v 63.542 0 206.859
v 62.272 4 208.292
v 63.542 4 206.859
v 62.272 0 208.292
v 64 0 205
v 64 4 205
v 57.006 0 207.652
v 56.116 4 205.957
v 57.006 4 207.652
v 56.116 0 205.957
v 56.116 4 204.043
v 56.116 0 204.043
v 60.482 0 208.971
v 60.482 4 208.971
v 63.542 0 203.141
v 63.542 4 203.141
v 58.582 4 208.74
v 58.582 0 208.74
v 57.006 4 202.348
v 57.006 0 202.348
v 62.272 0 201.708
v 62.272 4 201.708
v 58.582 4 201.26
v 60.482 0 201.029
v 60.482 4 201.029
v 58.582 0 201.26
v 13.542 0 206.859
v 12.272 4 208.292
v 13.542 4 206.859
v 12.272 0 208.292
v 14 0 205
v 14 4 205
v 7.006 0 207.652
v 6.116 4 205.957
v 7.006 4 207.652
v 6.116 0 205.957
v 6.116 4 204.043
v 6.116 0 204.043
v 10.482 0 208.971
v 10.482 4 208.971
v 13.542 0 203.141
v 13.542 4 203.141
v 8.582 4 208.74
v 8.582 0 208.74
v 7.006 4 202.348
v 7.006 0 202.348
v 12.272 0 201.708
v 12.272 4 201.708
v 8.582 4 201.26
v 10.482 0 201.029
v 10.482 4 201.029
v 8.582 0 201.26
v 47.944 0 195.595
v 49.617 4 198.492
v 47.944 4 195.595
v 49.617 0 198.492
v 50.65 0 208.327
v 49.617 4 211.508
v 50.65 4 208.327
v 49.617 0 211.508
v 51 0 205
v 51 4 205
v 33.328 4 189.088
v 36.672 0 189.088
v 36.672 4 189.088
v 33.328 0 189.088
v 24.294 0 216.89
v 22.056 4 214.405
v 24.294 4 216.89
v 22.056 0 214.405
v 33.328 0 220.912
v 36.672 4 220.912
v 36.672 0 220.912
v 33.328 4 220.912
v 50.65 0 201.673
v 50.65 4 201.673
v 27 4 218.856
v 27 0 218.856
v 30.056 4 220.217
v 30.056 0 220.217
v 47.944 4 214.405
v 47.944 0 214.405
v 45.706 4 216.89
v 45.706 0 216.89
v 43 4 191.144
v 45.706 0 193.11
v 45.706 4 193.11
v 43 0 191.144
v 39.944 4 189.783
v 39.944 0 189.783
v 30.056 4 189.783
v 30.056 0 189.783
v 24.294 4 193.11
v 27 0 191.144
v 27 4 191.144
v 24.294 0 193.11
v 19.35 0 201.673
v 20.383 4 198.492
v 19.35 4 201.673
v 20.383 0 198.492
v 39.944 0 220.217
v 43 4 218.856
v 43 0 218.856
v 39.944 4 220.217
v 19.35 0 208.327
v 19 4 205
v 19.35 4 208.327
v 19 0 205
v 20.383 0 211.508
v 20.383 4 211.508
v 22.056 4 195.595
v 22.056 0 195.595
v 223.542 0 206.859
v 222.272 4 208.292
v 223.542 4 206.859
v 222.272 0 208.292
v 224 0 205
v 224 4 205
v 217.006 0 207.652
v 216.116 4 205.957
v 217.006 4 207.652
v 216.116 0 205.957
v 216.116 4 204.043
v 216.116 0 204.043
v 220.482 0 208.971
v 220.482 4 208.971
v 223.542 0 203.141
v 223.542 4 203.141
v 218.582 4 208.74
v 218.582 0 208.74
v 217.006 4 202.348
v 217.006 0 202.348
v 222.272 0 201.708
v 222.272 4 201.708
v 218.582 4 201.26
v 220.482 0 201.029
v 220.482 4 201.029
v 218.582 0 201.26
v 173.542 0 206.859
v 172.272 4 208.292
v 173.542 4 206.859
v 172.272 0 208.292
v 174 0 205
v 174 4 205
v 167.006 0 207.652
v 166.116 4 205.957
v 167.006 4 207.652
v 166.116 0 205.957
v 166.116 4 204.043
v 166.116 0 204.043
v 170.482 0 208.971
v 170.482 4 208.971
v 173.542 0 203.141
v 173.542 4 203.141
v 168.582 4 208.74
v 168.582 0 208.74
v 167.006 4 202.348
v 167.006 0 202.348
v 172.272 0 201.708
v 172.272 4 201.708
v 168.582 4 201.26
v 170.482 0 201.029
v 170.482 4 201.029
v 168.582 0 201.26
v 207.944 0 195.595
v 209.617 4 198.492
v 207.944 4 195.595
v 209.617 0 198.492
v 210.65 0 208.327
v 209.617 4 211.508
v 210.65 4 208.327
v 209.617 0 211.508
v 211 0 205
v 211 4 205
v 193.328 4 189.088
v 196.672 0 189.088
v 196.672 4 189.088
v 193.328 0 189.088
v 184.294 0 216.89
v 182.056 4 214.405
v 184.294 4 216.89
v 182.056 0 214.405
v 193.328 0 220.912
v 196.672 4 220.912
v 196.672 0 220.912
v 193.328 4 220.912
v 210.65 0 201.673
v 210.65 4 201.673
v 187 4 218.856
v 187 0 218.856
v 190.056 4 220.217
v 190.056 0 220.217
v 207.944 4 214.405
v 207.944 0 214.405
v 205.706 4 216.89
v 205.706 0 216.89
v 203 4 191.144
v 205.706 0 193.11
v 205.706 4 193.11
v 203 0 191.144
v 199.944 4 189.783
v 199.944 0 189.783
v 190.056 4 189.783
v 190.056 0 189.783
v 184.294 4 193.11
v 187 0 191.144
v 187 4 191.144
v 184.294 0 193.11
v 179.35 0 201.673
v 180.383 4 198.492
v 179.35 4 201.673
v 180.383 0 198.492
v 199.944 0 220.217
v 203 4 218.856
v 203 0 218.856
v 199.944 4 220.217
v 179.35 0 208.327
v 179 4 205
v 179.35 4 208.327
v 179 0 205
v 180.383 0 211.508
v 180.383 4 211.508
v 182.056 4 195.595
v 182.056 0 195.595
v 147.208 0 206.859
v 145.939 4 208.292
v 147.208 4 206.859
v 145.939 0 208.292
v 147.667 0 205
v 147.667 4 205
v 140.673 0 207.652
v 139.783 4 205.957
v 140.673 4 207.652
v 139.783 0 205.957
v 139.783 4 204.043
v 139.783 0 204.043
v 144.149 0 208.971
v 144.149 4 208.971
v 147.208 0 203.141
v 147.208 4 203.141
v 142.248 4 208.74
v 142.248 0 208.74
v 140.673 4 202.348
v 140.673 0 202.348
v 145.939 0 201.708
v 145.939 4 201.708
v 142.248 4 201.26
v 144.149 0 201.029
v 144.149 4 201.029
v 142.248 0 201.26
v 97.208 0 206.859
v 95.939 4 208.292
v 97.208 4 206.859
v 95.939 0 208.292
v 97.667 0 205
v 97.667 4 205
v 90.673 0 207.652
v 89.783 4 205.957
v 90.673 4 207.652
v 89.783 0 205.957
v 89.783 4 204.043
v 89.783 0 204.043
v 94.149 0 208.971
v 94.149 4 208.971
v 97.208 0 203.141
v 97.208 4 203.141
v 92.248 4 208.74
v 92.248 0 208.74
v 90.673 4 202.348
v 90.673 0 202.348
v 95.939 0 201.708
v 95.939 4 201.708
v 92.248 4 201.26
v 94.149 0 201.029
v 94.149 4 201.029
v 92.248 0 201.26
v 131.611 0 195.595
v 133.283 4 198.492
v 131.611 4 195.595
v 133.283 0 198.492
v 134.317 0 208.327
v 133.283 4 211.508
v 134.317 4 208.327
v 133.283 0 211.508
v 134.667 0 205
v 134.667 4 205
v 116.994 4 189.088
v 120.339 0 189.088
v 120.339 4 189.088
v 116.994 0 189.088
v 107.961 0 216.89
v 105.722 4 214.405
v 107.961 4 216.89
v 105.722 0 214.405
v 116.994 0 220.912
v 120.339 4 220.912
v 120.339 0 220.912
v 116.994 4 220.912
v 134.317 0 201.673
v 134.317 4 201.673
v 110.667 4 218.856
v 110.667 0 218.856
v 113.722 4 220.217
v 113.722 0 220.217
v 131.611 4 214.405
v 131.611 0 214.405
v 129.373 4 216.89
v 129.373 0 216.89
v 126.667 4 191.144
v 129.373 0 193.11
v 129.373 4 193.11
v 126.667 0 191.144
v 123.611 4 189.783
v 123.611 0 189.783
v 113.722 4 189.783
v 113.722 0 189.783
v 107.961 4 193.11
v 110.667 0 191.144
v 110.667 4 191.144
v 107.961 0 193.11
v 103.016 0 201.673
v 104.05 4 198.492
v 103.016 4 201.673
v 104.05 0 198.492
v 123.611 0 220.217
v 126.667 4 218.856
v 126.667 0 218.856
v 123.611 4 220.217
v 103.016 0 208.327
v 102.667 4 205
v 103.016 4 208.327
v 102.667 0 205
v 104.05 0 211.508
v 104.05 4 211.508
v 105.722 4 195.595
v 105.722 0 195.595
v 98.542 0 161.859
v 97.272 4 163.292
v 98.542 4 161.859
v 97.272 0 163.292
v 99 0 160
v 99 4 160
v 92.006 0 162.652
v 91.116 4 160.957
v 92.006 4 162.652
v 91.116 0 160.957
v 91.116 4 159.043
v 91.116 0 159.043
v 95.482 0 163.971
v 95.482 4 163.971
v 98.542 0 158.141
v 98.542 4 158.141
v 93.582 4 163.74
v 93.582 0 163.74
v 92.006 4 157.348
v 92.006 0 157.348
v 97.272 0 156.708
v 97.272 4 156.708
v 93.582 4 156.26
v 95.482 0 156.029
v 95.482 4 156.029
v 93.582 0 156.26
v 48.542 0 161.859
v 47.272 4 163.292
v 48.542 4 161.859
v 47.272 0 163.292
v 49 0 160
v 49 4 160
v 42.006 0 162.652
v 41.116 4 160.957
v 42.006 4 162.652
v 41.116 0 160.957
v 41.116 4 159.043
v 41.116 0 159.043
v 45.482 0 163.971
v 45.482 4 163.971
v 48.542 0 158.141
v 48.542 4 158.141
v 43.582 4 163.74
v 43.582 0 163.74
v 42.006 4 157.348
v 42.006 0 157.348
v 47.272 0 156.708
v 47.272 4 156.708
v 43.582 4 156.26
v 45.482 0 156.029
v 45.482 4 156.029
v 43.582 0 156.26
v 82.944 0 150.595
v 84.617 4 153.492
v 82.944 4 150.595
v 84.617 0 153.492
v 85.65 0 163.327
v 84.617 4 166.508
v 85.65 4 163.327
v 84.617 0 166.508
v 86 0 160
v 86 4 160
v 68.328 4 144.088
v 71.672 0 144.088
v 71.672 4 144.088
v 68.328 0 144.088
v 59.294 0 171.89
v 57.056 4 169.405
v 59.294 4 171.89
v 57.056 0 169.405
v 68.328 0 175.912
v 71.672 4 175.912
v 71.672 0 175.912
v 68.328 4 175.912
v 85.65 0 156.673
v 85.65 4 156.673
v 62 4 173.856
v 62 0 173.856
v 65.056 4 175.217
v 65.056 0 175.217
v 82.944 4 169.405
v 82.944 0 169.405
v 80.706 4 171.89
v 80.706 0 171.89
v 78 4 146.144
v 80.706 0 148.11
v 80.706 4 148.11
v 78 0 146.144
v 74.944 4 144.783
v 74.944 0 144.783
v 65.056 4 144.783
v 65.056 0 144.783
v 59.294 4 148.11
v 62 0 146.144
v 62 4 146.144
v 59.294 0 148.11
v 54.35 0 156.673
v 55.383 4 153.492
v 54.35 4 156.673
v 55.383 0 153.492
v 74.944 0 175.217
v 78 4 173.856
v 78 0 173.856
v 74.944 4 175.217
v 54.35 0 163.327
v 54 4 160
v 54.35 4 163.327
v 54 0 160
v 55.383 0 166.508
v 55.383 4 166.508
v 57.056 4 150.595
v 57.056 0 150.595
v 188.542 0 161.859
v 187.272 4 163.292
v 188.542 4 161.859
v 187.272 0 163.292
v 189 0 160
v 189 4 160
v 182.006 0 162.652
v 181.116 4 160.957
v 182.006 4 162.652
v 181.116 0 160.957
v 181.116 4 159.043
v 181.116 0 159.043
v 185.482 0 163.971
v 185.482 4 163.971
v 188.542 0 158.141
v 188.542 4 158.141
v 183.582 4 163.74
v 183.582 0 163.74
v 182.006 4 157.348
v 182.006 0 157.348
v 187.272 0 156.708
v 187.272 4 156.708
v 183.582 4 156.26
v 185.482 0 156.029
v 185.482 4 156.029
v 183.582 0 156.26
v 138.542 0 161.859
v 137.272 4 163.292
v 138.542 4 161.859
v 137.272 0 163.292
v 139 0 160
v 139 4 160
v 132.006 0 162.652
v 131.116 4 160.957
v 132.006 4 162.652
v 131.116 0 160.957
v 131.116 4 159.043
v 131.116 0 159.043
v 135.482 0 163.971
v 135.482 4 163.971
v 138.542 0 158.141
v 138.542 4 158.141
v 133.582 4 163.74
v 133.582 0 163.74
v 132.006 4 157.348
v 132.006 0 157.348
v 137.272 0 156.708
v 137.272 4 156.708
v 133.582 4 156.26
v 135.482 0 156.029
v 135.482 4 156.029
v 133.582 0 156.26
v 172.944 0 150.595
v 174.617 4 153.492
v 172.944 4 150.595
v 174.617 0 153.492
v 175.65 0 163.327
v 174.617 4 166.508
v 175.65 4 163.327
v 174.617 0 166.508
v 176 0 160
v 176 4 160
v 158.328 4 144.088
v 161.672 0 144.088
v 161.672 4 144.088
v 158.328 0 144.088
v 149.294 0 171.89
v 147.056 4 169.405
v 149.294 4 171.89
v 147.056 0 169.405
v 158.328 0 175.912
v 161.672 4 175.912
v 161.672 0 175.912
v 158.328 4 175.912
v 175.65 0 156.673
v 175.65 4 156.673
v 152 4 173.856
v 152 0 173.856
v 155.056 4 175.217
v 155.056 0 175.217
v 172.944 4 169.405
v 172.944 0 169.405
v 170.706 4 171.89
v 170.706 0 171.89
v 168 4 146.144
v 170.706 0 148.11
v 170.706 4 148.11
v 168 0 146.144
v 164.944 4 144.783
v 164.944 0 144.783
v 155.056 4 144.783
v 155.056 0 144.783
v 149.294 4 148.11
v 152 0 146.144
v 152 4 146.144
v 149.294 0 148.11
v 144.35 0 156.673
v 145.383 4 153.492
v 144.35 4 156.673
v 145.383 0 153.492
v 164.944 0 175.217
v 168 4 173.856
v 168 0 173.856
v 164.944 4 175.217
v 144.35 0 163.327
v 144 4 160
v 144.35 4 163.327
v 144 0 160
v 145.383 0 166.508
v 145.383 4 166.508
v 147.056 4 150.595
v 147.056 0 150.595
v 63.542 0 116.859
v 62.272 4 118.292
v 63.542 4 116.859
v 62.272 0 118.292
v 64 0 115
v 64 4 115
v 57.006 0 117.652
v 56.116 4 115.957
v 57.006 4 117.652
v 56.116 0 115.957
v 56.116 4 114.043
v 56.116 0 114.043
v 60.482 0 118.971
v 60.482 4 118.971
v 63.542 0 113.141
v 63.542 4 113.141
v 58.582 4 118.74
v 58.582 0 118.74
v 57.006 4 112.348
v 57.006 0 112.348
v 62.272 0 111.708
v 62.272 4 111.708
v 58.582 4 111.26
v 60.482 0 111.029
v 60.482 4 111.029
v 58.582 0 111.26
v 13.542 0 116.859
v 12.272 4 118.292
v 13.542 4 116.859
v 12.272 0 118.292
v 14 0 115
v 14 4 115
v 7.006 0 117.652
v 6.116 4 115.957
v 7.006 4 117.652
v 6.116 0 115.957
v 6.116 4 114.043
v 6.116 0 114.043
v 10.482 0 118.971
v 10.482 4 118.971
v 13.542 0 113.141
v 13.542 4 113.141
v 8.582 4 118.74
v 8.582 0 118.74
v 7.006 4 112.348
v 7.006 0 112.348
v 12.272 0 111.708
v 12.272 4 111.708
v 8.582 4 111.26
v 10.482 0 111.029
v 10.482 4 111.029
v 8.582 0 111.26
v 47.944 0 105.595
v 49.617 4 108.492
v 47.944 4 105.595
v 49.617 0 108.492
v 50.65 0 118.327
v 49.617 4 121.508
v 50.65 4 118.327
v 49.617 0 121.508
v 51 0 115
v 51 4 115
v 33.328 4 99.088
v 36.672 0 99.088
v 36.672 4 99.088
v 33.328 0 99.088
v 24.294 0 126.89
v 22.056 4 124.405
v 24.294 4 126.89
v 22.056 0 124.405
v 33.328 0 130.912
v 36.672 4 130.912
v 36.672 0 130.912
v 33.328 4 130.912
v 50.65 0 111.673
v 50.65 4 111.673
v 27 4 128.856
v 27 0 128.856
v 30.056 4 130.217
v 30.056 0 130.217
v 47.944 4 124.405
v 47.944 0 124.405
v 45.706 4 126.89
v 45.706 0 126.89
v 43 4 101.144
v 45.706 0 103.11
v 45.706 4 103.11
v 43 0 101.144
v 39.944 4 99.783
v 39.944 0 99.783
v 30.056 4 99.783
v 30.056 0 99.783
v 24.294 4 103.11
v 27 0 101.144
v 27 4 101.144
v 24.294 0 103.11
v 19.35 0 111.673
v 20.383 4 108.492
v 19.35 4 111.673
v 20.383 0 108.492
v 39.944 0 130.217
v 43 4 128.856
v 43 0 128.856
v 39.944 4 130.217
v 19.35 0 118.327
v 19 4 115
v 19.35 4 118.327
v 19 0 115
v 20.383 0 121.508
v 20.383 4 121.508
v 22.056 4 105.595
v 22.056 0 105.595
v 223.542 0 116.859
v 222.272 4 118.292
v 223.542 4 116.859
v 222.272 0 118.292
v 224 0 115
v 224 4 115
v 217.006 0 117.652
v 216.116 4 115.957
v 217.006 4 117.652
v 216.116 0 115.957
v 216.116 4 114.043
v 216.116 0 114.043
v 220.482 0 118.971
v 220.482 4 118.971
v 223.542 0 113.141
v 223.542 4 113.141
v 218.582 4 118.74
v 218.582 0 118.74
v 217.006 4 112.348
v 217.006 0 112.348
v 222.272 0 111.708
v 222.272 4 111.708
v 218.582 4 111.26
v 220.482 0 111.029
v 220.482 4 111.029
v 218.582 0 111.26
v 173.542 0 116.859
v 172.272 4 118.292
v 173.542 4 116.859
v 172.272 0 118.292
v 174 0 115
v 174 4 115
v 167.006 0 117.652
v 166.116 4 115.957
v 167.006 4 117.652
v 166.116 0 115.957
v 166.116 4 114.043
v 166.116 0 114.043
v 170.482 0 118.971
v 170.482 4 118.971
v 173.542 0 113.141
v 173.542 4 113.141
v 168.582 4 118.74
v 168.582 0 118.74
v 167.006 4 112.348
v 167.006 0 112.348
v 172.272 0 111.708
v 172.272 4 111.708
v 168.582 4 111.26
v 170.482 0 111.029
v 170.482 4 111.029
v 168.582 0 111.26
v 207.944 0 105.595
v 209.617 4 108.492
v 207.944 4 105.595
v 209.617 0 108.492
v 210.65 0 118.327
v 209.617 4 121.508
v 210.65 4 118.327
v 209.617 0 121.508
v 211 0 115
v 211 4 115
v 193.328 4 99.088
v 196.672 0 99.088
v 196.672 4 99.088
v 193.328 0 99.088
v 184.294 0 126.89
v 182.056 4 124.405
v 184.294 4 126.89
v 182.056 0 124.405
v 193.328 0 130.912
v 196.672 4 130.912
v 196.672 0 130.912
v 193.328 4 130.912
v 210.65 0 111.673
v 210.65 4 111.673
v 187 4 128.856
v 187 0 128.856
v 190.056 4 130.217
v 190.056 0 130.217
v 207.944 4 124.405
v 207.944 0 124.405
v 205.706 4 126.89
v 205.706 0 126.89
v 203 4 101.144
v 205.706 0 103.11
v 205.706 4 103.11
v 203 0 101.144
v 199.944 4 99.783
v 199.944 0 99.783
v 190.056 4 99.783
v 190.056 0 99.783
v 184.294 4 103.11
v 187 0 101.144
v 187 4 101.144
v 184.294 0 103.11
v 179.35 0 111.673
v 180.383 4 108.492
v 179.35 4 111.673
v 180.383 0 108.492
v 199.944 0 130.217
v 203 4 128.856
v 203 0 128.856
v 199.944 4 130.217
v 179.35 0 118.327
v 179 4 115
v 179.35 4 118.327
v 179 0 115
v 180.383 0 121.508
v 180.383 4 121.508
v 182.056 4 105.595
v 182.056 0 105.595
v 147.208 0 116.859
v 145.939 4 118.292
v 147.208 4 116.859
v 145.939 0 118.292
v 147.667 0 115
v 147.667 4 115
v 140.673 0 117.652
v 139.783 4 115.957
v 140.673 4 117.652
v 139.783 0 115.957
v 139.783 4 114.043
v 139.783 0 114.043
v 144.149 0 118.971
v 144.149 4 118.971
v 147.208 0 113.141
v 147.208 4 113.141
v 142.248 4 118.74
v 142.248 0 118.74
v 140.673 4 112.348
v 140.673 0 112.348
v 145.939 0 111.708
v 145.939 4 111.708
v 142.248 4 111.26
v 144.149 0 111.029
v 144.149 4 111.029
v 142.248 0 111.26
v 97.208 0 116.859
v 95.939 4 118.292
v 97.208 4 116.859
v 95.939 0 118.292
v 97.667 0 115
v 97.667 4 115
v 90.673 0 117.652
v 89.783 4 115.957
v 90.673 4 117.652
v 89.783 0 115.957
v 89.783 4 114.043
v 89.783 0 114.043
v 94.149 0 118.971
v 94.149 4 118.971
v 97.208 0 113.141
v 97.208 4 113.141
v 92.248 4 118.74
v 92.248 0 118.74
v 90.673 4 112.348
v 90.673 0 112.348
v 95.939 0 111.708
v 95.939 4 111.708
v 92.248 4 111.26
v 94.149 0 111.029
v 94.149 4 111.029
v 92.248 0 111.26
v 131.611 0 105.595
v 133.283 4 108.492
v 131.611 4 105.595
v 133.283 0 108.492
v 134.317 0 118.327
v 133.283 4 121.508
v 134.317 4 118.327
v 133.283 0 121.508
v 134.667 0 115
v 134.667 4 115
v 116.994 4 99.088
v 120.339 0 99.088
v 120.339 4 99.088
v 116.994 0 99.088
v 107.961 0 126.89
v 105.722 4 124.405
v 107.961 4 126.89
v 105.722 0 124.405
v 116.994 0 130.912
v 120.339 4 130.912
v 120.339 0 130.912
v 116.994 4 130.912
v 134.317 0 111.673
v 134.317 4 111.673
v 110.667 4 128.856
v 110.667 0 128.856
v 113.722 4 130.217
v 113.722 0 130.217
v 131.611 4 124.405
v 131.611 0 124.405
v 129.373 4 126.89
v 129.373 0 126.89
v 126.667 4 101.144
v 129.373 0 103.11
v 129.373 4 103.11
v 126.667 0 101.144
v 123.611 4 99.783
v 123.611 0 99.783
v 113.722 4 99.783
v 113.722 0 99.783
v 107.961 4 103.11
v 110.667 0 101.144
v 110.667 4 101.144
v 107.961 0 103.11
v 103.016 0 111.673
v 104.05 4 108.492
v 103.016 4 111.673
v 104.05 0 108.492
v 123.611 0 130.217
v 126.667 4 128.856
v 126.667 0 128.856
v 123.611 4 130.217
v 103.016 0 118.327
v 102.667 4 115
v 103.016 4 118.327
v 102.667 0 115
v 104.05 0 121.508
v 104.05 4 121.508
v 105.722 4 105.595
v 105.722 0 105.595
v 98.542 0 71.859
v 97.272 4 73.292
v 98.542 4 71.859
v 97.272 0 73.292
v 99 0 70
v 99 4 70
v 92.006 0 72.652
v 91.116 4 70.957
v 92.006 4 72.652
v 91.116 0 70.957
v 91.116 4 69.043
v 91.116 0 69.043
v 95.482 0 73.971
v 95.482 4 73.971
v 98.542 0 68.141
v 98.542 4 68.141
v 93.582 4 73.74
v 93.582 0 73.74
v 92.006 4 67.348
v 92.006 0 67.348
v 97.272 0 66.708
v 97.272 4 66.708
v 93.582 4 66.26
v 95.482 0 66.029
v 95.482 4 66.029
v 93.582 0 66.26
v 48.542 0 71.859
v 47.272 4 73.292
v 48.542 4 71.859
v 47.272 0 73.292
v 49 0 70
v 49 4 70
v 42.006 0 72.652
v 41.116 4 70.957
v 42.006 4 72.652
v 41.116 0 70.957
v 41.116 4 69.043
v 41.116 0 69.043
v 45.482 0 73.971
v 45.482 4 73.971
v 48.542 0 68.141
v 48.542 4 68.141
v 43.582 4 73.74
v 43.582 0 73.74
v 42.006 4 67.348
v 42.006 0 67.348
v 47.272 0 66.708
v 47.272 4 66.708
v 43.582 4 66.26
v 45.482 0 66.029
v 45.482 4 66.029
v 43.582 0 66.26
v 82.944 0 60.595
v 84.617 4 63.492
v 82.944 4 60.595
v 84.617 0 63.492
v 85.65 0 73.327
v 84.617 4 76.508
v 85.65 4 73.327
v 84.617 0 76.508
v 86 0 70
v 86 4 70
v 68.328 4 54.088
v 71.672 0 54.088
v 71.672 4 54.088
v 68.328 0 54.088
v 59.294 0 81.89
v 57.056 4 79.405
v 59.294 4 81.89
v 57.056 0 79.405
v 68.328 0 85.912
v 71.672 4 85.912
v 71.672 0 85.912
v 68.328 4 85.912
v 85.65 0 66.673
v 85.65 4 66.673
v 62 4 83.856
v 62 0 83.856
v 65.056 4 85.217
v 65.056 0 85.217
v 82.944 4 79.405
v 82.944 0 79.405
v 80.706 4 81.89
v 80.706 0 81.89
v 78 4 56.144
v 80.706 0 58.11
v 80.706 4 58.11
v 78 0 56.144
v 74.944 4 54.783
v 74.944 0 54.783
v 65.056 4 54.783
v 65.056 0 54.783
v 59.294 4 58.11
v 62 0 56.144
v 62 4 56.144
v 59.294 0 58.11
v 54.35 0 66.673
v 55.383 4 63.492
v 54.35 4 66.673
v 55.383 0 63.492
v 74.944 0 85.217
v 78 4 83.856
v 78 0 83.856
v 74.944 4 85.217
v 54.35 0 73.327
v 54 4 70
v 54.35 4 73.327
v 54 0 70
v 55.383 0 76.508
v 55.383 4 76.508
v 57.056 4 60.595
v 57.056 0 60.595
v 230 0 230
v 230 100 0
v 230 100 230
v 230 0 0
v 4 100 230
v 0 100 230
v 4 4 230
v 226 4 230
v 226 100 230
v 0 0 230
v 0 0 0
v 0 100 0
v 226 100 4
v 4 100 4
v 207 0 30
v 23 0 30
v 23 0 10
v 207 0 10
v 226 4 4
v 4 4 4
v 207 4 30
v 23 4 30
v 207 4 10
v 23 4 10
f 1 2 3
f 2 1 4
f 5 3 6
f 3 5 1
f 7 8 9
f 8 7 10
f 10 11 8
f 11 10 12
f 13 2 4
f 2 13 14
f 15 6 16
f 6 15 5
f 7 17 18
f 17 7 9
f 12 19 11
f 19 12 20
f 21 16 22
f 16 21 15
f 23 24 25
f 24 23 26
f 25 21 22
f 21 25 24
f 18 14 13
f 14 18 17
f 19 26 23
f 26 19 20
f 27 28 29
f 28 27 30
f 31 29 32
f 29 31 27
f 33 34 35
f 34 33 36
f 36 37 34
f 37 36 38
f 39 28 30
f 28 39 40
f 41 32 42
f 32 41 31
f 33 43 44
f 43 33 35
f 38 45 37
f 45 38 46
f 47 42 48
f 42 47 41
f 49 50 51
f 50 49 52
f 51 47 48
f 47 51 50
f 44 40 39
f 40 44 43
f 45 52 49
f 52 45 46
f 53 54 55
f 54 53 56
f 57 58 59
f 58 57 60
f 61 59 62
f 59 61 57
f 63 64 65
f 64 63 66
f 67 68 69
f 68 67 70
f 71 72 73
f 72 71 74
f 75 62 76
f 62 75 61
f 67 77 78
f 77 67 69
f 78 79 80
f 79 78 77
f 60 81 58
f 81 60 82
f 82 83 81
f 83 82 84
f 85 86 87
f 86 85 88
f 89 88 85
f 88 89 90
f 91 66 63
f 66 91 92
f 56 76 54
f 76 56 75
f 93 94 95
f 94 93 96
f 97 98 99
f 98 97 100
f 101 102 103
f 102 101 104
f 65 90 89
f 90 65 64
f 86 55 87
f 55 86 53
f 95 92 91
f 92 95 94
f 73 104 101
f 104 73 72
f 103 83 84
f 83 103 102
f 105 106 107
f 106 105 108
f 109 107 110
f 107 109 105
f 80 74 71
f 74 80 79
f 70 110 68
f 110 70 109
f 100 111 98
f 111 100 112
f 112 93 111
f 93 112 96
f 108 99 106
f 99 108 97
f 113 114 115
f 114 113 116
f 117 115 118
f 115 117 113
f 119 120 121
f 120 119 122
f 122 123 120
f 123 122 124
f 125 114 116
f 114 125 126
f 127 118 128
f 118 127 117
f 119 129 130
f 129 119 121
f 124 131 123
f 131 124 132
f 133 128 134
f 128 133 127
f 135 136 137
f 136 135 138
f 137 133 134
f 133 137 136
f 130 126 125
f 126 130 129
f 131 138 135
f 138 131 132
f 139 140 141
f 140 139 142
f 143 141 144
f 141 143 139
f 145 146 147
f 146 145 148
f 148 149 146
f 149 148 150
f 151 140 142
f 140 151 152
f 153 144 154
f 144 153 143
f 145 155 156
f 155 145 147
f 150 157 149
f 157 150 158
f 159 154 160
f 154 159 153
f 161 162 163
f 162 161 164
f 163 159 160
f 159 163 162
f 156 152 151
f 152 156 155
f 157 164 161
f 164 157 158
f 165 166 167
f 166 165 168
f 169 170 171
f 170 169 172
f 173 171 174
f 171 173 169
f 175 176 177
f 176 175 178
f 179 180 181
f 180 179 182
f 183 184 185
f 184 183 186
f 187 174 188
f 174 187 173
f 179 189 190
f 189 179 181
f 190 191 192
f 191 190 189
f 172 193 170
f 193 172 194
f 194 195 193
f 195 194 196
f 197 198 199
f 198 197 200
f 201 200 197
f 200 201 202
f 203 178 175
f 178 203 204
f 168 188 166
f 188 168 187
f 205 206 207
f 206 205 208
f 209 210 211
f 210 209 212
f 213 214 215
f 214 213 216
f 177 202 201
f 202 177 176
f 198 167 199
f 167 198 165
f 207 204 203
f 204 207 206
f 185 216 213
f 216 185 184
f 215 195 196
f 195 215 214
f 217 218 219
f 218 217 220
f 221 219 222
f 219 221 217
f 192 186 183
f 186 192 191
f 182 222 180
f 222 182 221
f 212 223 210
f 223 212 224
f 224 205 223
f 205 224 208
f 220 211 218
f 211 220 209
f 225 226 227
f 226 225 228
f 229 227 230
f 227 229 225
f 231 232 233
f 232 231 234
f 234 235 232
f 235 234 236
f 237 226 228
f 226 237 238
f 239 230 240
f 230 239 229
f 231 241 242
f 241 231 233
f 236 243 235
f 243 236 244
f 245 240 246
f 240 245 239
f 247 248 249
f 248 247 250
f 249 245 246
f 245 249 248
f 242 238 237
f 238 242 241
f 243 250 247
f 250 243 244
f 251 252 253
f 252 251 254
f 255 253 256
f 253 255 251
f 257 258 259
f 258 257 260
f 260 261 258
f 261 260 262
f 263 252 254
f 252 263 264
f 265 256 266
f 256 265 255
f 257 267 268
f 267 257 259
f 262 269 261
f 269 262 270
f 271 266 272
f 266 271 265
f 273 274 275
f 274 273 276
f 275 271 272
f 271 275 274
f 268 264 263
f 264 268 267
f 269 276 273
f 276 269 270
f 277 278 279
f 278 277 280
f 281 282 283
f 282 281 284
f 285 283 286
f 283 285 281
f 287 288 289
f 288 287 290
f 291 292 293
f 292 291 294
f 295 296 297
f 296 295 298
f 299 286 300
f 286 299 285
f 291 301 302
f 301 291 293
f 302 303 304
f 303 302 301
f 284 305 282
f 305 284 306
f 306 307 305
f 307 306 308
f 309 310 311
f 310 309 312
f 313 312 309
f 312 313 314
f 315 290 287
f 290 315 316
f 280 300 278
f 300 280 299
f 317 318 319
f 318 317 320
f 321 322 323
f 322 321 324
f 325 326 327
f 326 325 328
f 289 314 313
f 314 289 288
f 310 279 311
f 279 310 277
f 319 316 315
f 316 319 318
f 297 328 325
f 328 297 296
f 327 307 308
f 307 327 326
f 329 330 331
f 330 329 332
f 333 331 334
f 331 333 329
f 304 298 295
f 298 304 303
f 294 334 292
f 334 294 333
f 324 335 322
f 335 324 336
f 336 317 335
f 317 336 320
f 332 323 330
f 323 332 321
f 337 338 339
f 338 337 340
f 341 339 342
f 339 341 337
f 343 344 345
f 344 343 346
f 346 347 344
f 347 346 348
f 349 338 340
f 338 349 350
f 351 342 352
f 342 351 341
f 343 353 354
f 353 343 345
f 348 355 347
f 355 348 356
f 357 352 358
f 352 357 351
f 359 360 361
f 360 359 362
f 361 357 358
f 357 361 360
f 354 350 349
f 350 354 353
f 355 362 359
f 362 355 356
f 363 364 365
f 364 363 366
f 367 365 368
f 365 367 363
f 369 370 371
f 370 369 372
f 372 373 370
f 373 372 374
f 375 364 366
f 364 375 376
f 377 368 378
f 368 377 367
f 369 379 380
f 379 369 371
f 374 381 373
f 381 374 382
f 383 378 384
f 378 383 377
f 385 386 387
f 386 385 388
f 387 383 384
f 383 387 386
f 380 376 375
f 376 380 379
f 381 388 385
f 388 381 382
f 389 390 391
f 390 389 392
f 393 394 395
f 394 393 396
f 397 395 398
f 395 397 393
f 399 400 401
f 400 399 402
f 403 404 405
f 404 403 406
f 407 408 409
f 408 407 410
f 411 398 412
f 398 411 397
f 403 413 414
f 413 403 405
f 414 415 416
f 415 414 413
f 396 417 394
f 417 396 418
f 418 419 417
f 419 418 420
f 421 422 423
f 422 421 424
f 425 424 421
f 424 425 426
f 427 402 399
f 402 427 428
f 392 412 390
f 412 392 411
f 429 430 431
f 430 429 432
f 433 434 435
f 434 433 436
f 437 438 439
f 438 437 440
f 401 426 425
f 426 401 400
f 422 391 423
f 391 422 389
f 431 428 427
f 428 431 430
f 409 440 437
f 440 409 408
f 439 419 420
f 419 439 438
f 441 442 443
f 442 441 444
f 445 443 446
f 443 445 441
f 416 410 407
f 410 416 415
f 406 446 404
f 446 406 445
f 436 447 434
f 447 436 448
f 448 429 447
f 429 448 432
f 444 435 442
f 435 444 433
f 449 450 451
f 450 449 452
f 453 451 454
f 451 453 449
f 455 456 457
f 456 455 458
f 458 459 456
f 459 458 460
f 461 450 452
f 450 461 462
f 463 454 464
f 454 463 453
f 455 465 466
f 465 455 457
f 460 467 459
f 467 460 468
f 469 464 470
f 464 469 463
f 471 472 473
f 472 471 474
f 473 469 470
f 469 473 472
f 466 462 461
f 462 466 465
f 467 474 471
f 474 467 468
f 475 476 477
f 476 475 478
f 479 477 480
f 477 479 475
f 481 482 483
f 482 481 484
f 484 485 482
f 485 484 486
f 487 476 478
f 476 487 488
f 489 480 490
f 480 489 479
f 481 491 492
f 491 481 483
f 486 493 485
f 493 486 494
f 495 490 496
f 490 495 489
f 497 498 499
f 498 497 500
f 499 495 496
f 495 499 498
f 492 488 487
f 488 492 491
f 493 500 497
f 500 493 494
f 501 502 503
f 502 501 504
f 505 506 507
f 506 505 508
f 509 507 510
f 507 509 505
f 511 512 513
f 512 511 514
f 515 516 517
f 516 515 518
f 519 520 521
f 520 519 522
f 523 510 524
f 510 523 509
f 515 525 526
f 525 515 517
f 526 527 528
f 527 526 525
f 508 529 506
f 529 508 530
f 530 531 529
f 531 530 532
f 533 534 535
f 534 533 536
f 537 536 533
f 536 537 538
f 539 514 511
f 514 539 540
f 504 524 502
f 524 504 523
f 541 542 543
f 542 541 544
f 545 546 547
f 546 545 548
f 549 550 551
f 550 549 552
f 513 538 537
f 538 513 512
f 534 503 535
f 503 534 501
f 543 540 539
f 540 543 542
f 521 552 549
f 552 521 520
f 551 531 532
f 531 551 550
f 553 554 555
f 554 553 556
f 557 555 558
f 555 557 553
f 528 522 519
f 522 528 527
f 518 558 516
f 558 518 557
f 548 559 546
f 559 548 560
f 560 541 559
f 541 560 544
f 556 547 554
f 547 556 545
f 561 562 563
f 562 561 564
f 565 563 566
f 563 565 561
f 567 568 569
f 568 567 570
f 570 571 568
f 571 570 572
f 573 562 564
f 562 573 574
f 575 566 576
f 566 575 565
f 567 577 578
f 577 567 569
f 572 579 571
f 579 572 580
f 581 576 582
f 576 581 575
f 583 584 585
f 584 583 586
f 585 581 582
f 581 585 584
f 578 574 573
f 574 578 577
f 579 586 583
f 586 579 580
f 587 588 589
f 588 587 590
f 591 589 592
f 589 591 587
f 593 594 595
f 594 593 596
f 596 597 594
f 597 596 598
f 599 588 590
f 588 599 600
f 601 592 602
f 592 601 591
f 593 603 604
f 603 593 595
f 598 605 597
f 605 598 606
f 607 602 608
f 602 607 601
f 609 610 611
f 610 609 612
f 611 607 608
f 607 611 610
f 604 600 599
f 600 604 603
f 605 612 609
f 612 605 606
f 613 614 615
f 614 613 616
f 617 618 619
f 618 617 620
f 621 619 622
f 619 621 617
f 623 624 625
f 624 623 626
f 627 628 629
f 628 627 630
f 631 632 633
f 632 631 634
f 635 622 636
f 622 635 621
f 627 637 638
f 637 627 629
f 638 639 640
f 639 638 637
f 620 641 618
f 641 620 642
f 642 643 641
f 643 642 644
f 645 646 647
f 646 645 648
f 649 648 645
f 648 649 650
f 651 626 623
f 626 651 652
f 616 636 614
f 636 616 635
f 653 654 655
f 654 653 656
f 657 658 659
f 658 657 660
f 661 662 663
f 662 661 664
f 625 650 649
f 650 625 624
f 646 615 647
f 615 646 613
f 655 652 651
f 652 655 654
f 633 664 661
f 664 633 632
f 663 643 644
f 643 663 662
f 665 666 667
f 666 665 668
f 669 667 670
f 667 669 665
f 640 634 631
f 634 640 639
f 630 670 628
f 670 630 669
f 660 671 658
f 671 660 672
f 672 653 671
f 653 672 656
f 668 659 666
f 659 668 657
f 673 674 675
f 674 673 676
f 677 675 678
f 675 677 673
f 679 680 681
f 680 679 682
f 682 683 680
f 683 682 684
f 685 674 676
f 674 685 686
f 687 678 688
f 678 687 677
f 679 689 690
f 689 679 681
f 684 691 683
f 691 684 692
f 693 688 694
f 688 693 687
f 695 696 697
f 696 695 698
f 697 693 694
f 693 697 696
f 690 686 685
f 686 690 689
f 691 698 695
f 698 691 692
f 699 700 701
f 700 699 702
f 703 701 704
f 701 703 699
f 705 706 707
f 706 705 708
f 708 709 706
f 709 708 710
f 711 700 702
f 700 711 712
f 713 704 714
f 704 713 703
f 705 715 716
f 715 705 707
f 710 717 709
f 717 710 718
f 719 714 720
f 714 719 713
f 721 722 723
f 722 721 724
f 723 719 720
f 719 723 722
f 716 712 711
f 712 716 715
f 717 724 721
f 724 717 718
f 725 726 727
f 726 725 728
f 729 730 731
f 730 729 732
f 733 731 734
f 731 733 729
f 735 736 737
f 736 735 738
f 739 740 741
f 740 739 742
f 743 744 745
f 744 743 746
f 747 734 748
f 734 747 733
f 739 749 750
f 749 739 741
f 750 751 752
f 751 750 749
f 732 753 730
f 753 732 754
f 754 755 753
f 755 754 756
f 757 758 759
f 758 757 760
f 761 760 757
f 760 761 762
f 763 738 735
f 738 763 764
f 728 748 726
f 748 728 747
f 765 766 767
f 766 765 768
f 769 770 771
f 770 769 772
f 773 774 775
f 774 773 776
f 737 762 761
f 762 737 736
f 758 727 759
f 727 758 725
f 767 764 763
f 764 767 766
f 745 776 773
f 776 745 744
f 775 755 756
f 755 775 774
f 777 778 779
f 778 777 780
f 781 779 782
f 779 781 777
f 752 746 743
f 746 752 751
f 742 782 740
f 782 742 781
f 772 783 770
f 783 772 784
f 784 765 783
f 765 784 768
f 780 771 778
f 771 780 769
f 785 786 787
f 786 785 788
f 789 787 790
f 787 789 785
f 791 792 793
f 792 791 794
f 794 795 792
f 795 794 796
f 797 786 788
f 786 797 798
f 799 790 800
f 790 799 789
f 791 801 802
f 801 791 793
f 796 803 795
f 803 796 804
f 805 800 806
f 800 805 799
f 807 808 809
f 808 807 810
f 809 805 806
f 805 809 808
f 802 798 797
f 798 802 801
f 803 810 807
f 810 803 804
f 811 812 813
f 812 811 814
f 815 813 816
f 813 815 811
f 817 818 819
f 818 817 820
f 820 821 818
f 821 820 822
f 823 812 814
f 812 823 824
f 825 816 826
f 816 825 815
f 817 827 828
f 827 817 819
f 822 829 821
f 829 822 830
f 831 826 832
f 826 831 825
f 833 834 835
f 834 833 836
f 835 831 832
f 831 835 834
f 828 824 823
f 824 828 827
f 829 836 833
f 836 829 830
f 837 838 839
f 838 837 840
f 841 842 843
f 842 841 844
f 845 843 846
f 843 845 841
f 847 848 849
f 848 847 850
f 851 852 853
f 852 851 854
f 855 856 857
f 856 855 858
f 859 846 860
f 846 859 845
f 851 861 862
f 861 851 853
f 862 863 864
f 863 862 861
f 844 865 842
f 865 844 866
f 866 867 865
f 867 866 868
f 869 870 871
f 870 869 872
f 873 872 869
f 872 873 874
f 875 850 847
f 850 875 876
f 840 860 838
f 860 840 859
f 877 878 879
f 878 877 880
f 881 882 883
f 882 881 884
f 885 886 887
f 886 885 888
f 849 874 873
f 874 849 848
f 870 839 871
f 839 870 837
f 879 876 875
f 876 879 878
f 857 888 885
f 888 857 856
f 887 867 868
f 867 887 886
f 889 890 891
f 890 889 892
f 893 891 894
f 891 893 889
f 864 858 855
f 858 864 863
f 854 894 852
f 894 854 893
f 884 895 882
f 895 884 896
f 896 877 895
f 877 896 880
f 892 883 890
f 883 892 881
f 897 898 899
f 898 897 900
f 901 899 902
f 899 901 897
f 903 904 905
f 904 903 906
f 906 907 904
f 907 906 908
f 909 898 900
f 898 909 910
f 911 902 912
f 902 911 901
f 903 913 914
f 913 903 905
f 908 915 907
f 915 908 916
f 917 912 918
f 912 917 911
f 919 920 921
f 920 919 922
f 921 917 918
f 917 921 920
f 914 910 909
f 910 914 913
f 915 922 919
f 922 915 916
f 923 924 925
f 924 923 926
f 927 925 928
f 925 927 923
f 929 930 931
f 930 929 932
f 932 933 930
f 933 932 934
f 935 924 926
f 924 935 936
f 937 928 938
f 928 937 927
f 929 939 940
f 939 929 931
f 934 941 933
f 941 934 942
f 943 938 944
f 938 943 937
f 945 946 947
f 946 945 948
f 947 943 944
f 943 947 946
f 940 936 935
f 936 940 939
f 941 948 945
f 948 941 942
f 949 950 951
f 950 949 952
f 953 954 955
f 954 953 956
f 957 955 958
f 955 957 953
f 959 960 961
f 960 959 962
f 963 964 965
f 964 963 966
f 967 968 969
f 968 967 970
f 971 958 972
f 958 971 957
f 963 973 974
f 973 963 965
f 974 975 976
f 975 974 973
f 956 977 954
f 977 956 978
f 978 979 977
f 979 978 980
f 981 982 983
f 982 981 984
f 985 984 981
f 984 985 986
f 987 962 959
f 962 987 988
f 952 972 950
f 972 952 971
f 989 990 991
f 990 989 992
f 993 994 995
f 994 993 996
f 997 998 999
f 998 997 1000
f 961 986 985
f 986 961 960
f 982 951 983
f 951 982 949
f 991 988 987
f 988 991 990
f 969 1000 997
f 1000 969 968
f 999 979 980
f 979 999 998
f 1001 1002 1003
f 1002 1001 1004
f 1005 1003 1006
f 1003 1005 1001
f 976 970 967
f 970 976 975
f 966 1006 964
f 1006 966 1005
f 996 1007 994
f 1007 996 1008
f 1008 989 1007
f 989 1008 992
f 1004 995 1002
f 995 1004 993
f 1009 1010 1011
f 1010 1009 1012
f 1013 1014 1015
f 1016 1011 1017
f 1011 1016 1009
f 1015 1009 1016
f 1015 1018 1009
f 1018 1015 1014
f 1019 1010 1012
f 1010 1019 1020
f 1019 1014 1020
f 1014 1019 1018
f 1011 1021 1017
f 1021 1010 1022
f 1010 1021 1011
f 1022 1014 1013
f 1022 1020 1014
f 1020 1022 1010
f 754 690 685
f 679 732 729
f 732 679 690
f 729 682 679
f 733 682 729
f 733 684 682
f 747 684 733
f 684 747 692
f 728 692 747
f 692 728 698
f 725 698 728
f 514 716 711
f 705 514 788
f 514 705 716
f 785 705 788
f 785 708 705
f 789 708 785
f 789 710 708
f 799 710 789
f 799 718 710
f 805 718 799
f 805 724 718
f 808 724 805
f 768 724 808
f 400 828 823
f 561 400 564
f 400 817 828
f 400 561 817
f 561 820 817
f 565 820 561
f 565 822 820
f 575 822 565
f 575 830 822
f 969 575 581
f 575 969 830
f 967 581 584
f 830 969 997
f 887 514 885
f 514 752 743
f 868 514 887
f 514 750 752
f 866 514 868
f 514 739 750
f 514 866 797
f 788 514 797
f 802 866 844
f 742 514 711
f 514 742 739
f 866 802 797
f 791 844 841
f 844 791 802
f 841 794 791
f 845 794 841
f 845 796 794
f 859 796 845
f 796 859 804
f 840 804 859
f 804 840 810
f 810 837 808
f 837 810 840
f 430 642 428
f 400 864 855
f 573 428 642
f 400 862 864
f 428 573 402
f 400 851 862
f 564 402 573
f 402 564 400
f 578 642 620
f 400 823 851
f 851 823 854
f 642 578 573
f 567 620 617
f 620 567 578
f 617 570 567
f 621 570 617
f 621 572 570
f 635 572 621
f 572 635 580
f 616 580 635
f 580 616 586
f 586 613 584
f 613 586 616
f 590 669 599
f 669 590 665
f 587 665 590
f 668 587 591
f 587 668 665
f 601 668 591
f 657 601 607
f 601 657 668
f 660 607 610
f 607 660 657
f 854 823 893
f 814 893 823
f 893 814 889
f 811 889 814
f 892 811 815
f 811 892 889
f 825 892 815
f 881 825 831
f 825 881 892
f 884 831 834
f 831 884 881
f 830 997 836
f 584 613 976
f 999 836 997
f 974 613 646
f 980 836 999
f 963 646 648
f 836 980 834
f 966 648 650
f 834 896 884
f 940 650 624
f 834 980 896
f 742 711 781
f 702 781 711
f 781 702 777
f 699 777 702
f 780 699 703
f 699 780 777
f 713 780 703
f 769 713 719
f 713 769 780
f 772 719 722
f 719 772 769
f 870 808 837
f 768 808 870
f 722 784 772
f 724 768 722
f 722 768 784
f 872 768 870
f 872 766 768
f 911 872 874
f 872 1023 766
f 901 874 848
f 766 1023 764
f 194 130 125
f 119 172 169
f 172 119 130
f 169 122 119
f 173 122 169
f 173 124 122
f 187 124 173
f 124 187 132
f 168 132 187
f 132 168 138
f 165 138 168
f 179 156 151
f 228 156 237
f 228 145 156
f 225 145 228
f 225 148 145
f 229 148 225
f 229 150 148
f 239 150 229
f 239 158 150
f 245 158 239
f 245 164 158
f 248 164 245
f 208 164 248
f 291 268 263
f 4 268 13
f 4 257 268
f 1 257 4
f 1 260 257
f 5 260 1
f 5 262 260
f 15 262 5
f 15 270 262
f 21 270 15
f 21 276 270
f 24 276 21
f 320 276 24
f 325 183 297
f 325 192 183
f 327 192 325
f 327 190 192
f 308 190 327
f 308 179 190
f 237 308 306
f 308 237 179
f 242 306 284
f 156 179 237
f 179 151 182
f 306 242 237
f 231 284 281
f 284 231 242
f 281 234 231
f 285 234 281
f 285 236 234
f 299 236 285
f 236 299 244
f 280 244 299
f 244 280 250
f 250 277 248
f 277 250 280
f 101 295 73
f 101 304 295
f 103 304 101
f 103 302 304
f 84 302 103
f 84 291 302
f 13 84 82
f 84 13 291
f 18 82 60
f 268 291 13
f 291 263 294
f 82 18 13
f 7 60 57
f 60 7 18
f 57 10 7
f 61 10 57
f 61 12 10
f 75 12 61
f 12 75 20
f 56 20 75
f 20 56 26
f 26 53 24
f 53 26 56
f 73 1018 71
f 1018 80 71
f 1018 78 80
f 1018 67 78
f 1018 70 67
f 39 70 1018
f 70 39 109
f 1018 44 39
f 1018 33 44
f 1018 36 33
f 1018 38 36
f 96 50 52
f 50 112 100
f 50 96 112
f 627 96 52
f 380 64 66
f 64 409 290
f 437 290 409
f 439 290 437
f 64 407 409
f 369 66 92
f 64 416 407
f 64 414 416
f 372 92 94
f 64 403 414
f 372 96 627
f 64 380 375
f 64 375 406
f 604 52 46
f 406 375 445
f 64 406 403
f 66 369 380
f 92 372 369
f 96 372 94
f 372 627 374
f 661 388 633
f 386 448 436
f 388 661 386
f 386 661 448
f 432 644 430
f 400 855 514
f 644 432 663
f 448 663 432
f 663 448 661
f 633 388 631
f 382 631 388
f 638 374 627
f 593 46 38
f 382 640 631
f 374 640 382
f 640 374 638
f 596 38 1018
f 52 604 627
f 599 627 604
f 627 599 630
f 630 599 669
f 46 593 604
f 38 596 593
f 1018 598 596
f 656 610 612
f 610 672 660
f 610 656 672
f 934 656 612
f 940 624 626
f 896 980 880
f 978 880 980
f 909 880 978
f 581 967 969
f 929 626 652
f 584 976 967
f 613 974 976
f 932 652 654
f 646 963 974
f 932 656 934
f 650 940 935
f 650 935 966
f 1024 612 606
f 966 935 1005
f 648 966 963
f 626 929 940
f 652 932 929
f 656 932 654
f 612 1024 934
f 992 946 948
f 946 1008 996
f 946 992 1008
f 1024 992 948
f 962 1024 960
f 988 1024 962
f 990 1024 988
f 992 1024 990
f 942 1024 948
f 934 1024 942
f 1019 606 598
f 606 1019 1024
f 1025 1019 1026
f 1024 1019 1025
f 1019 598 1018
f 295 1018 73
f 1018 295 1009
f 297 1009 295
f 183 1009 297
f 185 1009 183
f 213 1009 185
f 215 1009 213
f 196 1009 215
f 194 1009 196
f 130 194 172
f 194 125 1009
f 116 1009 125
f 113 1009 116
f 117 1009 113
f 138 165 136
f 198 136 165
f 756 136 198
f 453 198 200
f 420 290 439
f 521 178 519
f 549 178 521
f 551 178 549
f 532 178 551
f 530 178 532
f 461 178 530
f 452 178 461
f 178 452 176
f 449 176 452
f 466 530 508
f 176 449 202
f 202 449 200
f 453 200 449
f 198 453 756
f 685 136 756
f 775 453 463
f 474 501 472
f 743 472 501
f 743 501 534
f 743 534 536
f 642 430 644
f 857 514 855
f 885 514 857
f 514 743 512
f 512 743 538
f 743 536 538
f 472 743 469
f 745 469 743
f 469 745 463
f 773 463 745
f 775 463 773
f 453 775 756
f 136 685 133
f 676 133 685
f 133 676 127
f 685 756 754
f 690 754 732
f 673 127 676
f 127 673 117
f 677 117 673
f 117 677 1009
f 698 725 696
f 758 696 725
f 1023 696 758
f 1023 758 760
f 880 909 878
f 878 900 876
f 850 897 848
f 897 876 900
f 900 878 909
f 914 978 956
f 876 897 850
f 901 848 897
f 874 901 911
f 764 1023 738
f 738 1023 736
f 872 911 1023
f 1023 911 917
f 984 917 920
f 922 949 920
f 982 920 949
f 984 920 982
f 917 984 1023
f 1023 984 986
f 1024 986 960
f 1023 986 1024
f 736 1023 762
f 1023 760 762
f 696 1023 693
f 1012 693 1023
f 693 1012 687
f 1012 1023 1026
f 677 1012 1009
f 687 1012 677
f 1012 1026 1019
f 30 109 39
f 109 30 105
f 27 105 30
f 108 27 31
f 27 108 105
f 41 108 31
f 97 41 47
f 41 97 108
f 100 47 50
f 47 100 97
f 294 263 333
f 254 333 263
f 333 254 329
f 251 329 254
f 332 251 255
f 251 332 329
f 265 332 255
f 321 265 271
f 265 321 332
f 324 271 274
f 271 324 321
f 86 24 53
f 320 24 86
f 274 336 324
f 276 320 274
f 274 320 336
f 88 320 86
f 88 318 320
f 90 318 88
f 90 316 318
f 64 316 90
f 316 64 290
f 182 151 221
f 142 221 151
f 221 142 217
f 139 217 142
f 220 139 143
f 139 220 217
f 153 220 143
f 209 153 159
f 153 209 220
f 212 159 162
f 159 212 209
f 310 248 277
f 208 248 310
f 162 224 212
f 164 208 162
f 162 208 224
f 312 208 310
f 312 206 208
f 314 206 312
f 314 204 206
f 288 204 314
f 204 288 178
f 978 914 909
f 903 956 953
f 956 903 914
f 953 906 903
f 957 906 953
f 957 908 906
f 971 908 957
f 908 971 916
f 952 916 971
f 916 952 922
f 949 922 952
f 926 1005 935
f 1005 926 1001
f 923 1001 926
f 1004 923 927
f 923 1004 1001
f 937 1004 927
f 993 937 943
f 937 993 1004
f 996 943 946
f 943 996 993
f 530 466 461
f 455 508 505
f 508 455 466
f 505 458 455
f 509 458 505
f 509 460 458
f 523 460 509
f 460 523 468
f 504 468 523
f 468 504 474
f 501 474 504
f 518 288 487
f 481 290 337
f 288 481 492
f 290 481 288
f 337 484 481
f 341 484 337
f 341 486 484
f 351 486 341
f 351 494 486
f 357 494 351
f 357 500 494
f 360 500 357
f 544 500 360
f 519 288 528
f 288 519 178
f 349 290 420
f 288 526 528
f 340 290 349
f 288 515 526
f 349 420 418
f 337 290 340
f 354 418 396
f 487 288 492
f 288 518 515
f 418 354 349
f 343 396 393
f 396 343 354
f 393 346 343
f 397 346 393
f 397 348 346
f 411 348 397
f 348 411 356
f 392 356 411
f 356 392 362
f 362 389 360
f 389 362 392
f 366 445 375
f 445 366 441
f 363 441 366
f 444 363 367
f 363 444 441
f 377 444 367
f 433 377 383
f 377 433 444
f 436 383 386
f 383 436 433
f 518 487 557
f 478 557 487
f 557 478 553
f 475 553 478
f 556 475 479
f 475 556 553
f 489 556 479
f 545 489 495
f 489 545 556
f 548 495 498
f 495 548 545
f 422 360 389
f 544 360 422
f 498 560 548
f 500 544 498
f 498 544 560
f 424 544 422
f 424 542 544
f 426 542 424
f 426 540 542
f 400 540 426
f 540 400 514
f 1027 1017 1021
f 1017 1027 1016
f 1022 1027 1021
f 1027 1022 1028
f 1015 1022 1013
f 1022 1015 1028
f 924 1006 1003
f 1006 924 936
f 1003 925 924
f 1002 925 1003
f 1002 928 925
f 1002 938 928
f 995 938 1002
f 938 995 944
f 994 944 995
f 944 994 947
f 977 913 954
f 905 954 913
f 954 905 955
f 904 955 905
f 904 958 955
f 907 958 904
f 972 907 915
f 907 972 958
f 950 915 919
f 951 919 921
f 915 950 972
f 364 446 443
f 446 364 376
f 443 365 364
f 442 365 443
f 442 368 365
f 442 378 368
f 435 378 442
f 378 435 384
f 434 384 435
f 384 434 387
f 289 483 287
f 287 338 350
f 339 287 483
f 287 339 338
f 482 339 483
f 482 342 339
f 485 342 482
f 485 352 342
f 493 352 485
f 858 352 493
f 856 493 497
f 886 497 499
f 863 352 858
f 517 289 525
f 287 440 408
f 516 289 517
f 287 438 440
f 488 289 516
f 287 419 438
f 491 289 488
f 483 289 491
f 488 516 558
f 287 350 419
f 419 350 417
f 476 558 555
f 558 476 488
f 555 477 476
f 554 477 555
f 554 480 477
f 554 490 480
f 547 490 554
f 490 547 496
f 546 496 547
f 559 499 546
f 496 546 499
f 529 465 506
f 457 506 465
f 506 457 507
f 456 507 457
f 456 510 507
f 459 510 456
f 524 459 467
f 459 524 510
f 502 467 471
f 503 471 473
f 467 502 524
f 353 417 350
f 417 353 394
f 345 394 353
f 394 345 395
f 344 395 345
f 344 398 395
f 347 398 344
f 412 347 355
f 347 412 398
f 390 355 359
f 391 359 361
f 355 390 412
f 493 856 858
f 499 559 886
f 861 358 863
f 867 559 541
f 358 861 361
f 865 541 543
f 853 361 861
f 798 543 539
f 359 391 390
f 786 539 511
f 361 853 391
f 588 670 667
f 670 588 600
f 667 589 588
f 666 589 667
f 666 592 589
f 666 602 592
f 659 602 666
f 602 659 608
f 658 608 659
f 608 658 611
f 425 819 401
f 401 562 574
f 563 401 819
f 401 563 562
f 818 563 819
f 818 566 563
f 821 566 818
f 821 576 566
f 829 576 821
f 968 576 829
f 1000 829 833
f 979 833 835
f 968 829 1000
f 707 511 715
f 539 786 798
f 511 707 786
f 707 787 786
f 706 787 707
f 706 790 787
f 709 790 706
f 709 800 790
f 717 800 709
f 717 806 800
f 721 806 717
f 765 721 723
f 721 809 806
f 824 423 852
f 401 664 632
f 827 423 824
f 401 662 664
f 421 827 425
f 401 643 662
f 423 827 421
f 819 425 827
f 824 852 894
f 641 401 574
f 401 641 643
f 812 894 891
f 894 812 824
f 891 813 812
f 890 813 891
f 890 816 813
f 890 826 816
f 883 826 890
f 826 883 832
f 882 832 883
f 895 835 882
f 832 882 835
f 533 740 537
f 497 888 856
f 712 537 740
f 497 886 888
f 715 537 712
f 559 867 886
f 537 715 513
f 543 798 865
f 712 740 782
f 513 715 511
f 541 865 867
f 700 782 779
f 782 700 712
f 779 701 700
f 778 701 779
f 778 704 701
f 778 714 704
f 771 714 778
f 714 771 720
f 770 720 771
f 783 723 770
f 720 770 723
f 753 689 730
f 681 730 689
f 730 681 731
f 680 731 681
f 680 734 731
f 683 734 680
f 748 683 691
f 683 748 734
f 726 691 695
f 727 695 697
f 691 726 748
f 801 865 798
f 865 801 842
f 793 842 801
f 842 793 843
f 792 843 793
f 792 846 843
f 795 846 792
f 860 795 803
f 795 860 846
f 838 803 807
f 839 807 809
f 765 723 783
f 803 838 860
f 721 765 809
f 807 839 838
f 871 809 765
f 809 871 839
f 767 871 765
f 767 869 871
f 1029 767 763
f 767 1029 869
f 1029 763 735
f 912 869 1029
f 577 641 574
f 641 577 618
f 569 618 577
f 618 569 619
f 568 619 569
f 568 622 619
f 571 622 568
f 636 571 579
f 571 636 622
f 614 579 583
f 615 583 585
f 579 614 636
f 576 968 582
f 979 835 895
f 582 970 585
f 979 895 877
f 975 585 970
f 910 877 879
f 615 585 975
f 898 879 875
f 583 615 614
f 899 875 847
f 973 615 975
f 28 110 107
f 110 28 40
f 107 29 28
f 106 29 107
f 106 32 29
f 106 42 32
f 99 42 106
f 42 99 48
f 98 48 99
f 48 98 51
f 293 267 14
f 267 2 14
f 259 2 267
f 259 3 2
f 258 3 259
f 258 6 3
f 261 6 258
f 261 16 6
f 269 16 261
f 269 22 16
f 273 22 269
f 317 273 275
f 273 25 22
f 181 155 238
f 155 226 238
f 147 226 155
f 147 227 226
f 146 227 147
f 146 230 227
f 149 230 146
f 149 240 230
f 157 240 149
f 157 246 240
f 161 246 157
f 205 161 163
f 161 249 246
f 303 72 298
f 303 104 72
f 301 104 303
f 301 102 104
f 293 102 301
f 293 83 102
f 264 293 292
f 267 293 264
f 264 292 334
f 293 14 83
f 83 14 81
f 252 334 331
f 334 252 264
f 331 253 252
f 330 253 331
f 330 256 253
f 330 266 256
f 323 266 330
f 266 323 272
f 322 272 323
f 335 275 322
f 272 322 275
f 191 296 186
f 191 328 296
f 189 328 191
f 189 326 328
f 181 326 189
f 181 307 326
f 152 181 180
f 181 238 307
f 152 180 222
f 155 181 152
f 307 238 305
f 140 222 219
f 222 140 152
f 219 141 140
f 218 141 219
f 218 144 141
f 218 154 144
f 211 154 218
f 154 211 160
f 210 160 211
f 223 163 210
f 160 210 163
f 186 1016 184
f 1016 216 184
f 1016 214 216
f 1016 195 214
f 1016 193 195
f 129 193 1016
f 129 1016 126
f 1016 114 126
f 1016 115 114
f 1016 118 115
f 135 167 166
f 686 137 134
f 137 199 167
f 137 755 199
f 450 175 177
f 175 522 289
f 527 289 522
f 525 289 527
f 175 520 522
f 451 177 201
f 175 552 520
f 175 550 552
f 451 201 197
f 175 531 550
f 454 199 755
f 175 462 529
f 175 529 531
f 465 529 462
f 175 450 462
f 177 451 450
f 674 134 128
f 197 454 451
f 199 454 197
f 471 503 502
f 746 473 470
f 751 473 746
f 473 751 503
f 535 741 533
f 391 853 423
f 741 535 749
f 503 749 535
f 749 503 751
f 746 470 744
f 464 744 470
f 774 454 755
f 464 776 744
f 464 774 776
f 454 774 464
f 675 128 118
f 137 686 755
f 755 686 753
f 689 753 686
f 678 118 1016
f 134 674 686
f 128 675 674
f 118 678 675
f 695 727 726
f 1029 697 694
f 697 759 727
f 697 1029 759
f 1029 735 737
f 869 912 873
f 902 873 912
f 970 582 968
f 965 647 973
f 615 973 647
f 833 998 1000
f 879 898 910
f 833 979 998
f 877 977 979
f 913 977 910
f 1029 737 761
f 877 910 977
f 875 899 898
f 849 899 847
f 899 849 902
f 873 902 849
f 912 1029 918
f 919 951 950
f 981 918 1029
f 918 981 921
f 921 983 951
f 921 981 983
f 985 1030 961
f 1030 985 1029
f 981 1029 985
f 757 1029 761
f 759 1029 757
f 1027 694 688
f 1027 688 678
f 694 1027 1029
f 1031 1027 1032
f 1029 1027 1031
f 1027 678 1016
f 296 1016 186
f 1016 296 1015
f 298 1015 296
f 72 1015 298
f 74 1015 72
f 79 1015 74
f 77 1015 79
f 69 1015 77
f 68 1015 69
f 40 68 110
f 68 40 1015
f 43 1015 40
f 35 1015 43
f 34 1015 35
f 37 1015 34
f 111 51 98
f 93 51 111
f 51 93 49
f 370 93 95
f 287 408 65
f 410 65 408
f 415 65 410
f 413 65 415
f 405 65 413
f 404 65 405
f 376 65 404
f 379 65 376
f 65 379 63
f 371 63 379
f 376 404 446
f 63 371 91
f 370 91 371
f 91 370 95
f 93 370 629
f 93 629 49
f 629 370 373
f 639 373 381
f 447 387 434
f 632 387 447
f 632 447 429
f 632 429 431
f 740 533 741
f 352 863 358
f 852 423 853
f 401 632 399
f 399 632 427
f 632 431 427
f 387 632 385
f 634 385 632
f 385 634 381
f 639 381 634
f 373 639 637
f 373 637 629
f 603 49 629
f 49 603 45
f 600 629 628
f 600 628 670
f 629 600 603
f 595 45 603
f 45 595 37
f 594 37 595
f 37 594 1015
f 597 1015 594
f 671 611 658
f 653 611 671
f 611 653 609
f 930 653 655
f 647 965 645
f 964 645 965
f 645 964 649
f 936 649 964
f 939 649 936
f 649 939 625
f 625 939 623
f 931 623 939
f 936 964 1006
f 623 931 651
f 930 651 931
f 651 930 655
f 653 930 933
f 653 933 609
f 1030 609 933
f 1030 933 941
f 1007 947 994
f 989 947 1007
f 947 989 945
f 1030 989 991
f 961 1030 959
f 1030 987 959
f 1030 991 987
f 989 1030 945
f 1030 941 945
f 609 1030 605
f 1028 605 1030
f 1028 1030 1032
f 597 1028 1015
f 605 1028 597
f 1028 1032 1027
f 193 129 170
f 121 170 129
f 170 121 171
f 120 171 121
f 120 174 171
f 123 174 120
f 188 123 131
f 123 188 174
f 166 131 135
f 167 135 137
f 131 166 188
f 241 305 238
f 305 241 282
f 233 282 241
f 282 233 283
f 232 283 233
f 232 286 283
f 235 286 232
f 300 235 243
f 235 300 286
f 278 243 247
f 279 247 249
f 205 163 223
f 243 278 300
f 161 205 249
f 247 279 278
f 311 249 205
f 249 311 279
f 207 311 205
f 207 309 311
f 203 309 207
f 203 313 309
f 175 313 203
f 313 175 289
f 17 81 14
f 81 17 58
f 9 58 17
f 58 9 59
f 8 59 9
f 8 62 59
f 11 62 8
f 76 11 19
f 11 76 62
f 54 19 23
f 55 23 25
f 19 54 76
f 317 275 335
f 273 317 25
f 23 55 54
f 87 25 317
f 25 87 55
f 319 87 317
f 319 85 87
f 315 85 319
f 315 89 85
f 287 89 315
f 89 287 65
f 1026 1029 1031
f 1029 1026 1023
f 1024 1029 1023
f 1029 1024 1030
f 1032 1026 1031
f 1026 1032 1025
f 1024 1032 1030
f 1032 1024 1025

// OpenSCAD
// file: pump_mount.scad
module pump_mount (){
    // Pump mount for Log
    pump_hole_separation = 50;
    pump_hole_inset = 10;

    pump_housing_length = 50 + pump_hole_inset + 10;
    pump_housing_width = 10;

    pump_screw_radius = 4;
    pump_hole_center = 0;
    
   
    cylinder_height = pump_housing_width * 1.5;
    cylinder_depth = pump_housing_width*1.1;
    translate([pump_hole_separation + pump_hole_inset,pump_housing_width * 1.1,pump_hole_center])
        rotate([90,0,0])
        cylinder(cylinder_height, pump_screw_radius, pump_screw_radius);
    translate([pump_hole_inset,cylinder_depth,pump_hole_center])
        rotate([90,0,0])
        cylinder(cylinder_height, pump_screw_radius, pump_screw_radius);
    translate([pump_housing_length/2, pump_housing_width*1.1,pump_hole_center])
        rotate([90,0,0])
        cylinder(cylinder_height, 16, 16);
    
}

//pump_mount();
// main file
include <pump_mount.scad>;

body_width = 230;
body_depth = 100;
body_height = 230;

module body(){
    shell_thickness = 4;

    difference(){
        cube([body_width,body_depth,body_height]);
        translate([shell_thickness,shell_thickness,shell_thickness])
            #cube([body_width - shell_thickness * 2,body_depth - shell_thickness * 2 + 20, 10 + body_height - shell_thickness * 2]);
        inset = (body_width - ((body_width / 5) * 4) )/ 2;
        translate([inset,-10,10])
            #cube([(body_width / 5) * 4, 20, 20]);
        //translate([body_width/2,0,body_height/2]) rotate([90,0,0]) #cylinder(r=40, h=10, center=true);
        // Add our pump mounts
        rotate([0,0,0]) translate([0,0,body_height - 25])  pump_mount();
        rotate([0,0,0]) translate([body_width - 70,0,body_height - 25])  pump_mount();
        rotate([0,0,0]) translate([body_width / 3 + 7,0,body_height - 25])  pump_mount();
        rotate([0,0,0]) translate([35,0,body_height - 70])  pump_mount();
        rotate([0,0,0]) translate([125,0,body_height - 70])  pump_mount();

        rotate([0,0,0]) translate([0,0,body_height - 115])  pump_mount();
        rotate([0,0,0]) translate([body_width - 70,0,body_height - 115])  pump_mount();
        rotate([0,0,0]) translate([body_width / 3 + 7,0,body_height - 115])  pump_mount();
        rotate([0,0,0]) translate([35,0,body_height - 160])  pump_mount();
        //rotate([0,0,0]) translate([125,0,body_height - 175])  pump_mount();
        //translate([body_width/24,0,body_height - 30]) rotate([0,0,0]) pump_mount();
       
    }
}



body();
